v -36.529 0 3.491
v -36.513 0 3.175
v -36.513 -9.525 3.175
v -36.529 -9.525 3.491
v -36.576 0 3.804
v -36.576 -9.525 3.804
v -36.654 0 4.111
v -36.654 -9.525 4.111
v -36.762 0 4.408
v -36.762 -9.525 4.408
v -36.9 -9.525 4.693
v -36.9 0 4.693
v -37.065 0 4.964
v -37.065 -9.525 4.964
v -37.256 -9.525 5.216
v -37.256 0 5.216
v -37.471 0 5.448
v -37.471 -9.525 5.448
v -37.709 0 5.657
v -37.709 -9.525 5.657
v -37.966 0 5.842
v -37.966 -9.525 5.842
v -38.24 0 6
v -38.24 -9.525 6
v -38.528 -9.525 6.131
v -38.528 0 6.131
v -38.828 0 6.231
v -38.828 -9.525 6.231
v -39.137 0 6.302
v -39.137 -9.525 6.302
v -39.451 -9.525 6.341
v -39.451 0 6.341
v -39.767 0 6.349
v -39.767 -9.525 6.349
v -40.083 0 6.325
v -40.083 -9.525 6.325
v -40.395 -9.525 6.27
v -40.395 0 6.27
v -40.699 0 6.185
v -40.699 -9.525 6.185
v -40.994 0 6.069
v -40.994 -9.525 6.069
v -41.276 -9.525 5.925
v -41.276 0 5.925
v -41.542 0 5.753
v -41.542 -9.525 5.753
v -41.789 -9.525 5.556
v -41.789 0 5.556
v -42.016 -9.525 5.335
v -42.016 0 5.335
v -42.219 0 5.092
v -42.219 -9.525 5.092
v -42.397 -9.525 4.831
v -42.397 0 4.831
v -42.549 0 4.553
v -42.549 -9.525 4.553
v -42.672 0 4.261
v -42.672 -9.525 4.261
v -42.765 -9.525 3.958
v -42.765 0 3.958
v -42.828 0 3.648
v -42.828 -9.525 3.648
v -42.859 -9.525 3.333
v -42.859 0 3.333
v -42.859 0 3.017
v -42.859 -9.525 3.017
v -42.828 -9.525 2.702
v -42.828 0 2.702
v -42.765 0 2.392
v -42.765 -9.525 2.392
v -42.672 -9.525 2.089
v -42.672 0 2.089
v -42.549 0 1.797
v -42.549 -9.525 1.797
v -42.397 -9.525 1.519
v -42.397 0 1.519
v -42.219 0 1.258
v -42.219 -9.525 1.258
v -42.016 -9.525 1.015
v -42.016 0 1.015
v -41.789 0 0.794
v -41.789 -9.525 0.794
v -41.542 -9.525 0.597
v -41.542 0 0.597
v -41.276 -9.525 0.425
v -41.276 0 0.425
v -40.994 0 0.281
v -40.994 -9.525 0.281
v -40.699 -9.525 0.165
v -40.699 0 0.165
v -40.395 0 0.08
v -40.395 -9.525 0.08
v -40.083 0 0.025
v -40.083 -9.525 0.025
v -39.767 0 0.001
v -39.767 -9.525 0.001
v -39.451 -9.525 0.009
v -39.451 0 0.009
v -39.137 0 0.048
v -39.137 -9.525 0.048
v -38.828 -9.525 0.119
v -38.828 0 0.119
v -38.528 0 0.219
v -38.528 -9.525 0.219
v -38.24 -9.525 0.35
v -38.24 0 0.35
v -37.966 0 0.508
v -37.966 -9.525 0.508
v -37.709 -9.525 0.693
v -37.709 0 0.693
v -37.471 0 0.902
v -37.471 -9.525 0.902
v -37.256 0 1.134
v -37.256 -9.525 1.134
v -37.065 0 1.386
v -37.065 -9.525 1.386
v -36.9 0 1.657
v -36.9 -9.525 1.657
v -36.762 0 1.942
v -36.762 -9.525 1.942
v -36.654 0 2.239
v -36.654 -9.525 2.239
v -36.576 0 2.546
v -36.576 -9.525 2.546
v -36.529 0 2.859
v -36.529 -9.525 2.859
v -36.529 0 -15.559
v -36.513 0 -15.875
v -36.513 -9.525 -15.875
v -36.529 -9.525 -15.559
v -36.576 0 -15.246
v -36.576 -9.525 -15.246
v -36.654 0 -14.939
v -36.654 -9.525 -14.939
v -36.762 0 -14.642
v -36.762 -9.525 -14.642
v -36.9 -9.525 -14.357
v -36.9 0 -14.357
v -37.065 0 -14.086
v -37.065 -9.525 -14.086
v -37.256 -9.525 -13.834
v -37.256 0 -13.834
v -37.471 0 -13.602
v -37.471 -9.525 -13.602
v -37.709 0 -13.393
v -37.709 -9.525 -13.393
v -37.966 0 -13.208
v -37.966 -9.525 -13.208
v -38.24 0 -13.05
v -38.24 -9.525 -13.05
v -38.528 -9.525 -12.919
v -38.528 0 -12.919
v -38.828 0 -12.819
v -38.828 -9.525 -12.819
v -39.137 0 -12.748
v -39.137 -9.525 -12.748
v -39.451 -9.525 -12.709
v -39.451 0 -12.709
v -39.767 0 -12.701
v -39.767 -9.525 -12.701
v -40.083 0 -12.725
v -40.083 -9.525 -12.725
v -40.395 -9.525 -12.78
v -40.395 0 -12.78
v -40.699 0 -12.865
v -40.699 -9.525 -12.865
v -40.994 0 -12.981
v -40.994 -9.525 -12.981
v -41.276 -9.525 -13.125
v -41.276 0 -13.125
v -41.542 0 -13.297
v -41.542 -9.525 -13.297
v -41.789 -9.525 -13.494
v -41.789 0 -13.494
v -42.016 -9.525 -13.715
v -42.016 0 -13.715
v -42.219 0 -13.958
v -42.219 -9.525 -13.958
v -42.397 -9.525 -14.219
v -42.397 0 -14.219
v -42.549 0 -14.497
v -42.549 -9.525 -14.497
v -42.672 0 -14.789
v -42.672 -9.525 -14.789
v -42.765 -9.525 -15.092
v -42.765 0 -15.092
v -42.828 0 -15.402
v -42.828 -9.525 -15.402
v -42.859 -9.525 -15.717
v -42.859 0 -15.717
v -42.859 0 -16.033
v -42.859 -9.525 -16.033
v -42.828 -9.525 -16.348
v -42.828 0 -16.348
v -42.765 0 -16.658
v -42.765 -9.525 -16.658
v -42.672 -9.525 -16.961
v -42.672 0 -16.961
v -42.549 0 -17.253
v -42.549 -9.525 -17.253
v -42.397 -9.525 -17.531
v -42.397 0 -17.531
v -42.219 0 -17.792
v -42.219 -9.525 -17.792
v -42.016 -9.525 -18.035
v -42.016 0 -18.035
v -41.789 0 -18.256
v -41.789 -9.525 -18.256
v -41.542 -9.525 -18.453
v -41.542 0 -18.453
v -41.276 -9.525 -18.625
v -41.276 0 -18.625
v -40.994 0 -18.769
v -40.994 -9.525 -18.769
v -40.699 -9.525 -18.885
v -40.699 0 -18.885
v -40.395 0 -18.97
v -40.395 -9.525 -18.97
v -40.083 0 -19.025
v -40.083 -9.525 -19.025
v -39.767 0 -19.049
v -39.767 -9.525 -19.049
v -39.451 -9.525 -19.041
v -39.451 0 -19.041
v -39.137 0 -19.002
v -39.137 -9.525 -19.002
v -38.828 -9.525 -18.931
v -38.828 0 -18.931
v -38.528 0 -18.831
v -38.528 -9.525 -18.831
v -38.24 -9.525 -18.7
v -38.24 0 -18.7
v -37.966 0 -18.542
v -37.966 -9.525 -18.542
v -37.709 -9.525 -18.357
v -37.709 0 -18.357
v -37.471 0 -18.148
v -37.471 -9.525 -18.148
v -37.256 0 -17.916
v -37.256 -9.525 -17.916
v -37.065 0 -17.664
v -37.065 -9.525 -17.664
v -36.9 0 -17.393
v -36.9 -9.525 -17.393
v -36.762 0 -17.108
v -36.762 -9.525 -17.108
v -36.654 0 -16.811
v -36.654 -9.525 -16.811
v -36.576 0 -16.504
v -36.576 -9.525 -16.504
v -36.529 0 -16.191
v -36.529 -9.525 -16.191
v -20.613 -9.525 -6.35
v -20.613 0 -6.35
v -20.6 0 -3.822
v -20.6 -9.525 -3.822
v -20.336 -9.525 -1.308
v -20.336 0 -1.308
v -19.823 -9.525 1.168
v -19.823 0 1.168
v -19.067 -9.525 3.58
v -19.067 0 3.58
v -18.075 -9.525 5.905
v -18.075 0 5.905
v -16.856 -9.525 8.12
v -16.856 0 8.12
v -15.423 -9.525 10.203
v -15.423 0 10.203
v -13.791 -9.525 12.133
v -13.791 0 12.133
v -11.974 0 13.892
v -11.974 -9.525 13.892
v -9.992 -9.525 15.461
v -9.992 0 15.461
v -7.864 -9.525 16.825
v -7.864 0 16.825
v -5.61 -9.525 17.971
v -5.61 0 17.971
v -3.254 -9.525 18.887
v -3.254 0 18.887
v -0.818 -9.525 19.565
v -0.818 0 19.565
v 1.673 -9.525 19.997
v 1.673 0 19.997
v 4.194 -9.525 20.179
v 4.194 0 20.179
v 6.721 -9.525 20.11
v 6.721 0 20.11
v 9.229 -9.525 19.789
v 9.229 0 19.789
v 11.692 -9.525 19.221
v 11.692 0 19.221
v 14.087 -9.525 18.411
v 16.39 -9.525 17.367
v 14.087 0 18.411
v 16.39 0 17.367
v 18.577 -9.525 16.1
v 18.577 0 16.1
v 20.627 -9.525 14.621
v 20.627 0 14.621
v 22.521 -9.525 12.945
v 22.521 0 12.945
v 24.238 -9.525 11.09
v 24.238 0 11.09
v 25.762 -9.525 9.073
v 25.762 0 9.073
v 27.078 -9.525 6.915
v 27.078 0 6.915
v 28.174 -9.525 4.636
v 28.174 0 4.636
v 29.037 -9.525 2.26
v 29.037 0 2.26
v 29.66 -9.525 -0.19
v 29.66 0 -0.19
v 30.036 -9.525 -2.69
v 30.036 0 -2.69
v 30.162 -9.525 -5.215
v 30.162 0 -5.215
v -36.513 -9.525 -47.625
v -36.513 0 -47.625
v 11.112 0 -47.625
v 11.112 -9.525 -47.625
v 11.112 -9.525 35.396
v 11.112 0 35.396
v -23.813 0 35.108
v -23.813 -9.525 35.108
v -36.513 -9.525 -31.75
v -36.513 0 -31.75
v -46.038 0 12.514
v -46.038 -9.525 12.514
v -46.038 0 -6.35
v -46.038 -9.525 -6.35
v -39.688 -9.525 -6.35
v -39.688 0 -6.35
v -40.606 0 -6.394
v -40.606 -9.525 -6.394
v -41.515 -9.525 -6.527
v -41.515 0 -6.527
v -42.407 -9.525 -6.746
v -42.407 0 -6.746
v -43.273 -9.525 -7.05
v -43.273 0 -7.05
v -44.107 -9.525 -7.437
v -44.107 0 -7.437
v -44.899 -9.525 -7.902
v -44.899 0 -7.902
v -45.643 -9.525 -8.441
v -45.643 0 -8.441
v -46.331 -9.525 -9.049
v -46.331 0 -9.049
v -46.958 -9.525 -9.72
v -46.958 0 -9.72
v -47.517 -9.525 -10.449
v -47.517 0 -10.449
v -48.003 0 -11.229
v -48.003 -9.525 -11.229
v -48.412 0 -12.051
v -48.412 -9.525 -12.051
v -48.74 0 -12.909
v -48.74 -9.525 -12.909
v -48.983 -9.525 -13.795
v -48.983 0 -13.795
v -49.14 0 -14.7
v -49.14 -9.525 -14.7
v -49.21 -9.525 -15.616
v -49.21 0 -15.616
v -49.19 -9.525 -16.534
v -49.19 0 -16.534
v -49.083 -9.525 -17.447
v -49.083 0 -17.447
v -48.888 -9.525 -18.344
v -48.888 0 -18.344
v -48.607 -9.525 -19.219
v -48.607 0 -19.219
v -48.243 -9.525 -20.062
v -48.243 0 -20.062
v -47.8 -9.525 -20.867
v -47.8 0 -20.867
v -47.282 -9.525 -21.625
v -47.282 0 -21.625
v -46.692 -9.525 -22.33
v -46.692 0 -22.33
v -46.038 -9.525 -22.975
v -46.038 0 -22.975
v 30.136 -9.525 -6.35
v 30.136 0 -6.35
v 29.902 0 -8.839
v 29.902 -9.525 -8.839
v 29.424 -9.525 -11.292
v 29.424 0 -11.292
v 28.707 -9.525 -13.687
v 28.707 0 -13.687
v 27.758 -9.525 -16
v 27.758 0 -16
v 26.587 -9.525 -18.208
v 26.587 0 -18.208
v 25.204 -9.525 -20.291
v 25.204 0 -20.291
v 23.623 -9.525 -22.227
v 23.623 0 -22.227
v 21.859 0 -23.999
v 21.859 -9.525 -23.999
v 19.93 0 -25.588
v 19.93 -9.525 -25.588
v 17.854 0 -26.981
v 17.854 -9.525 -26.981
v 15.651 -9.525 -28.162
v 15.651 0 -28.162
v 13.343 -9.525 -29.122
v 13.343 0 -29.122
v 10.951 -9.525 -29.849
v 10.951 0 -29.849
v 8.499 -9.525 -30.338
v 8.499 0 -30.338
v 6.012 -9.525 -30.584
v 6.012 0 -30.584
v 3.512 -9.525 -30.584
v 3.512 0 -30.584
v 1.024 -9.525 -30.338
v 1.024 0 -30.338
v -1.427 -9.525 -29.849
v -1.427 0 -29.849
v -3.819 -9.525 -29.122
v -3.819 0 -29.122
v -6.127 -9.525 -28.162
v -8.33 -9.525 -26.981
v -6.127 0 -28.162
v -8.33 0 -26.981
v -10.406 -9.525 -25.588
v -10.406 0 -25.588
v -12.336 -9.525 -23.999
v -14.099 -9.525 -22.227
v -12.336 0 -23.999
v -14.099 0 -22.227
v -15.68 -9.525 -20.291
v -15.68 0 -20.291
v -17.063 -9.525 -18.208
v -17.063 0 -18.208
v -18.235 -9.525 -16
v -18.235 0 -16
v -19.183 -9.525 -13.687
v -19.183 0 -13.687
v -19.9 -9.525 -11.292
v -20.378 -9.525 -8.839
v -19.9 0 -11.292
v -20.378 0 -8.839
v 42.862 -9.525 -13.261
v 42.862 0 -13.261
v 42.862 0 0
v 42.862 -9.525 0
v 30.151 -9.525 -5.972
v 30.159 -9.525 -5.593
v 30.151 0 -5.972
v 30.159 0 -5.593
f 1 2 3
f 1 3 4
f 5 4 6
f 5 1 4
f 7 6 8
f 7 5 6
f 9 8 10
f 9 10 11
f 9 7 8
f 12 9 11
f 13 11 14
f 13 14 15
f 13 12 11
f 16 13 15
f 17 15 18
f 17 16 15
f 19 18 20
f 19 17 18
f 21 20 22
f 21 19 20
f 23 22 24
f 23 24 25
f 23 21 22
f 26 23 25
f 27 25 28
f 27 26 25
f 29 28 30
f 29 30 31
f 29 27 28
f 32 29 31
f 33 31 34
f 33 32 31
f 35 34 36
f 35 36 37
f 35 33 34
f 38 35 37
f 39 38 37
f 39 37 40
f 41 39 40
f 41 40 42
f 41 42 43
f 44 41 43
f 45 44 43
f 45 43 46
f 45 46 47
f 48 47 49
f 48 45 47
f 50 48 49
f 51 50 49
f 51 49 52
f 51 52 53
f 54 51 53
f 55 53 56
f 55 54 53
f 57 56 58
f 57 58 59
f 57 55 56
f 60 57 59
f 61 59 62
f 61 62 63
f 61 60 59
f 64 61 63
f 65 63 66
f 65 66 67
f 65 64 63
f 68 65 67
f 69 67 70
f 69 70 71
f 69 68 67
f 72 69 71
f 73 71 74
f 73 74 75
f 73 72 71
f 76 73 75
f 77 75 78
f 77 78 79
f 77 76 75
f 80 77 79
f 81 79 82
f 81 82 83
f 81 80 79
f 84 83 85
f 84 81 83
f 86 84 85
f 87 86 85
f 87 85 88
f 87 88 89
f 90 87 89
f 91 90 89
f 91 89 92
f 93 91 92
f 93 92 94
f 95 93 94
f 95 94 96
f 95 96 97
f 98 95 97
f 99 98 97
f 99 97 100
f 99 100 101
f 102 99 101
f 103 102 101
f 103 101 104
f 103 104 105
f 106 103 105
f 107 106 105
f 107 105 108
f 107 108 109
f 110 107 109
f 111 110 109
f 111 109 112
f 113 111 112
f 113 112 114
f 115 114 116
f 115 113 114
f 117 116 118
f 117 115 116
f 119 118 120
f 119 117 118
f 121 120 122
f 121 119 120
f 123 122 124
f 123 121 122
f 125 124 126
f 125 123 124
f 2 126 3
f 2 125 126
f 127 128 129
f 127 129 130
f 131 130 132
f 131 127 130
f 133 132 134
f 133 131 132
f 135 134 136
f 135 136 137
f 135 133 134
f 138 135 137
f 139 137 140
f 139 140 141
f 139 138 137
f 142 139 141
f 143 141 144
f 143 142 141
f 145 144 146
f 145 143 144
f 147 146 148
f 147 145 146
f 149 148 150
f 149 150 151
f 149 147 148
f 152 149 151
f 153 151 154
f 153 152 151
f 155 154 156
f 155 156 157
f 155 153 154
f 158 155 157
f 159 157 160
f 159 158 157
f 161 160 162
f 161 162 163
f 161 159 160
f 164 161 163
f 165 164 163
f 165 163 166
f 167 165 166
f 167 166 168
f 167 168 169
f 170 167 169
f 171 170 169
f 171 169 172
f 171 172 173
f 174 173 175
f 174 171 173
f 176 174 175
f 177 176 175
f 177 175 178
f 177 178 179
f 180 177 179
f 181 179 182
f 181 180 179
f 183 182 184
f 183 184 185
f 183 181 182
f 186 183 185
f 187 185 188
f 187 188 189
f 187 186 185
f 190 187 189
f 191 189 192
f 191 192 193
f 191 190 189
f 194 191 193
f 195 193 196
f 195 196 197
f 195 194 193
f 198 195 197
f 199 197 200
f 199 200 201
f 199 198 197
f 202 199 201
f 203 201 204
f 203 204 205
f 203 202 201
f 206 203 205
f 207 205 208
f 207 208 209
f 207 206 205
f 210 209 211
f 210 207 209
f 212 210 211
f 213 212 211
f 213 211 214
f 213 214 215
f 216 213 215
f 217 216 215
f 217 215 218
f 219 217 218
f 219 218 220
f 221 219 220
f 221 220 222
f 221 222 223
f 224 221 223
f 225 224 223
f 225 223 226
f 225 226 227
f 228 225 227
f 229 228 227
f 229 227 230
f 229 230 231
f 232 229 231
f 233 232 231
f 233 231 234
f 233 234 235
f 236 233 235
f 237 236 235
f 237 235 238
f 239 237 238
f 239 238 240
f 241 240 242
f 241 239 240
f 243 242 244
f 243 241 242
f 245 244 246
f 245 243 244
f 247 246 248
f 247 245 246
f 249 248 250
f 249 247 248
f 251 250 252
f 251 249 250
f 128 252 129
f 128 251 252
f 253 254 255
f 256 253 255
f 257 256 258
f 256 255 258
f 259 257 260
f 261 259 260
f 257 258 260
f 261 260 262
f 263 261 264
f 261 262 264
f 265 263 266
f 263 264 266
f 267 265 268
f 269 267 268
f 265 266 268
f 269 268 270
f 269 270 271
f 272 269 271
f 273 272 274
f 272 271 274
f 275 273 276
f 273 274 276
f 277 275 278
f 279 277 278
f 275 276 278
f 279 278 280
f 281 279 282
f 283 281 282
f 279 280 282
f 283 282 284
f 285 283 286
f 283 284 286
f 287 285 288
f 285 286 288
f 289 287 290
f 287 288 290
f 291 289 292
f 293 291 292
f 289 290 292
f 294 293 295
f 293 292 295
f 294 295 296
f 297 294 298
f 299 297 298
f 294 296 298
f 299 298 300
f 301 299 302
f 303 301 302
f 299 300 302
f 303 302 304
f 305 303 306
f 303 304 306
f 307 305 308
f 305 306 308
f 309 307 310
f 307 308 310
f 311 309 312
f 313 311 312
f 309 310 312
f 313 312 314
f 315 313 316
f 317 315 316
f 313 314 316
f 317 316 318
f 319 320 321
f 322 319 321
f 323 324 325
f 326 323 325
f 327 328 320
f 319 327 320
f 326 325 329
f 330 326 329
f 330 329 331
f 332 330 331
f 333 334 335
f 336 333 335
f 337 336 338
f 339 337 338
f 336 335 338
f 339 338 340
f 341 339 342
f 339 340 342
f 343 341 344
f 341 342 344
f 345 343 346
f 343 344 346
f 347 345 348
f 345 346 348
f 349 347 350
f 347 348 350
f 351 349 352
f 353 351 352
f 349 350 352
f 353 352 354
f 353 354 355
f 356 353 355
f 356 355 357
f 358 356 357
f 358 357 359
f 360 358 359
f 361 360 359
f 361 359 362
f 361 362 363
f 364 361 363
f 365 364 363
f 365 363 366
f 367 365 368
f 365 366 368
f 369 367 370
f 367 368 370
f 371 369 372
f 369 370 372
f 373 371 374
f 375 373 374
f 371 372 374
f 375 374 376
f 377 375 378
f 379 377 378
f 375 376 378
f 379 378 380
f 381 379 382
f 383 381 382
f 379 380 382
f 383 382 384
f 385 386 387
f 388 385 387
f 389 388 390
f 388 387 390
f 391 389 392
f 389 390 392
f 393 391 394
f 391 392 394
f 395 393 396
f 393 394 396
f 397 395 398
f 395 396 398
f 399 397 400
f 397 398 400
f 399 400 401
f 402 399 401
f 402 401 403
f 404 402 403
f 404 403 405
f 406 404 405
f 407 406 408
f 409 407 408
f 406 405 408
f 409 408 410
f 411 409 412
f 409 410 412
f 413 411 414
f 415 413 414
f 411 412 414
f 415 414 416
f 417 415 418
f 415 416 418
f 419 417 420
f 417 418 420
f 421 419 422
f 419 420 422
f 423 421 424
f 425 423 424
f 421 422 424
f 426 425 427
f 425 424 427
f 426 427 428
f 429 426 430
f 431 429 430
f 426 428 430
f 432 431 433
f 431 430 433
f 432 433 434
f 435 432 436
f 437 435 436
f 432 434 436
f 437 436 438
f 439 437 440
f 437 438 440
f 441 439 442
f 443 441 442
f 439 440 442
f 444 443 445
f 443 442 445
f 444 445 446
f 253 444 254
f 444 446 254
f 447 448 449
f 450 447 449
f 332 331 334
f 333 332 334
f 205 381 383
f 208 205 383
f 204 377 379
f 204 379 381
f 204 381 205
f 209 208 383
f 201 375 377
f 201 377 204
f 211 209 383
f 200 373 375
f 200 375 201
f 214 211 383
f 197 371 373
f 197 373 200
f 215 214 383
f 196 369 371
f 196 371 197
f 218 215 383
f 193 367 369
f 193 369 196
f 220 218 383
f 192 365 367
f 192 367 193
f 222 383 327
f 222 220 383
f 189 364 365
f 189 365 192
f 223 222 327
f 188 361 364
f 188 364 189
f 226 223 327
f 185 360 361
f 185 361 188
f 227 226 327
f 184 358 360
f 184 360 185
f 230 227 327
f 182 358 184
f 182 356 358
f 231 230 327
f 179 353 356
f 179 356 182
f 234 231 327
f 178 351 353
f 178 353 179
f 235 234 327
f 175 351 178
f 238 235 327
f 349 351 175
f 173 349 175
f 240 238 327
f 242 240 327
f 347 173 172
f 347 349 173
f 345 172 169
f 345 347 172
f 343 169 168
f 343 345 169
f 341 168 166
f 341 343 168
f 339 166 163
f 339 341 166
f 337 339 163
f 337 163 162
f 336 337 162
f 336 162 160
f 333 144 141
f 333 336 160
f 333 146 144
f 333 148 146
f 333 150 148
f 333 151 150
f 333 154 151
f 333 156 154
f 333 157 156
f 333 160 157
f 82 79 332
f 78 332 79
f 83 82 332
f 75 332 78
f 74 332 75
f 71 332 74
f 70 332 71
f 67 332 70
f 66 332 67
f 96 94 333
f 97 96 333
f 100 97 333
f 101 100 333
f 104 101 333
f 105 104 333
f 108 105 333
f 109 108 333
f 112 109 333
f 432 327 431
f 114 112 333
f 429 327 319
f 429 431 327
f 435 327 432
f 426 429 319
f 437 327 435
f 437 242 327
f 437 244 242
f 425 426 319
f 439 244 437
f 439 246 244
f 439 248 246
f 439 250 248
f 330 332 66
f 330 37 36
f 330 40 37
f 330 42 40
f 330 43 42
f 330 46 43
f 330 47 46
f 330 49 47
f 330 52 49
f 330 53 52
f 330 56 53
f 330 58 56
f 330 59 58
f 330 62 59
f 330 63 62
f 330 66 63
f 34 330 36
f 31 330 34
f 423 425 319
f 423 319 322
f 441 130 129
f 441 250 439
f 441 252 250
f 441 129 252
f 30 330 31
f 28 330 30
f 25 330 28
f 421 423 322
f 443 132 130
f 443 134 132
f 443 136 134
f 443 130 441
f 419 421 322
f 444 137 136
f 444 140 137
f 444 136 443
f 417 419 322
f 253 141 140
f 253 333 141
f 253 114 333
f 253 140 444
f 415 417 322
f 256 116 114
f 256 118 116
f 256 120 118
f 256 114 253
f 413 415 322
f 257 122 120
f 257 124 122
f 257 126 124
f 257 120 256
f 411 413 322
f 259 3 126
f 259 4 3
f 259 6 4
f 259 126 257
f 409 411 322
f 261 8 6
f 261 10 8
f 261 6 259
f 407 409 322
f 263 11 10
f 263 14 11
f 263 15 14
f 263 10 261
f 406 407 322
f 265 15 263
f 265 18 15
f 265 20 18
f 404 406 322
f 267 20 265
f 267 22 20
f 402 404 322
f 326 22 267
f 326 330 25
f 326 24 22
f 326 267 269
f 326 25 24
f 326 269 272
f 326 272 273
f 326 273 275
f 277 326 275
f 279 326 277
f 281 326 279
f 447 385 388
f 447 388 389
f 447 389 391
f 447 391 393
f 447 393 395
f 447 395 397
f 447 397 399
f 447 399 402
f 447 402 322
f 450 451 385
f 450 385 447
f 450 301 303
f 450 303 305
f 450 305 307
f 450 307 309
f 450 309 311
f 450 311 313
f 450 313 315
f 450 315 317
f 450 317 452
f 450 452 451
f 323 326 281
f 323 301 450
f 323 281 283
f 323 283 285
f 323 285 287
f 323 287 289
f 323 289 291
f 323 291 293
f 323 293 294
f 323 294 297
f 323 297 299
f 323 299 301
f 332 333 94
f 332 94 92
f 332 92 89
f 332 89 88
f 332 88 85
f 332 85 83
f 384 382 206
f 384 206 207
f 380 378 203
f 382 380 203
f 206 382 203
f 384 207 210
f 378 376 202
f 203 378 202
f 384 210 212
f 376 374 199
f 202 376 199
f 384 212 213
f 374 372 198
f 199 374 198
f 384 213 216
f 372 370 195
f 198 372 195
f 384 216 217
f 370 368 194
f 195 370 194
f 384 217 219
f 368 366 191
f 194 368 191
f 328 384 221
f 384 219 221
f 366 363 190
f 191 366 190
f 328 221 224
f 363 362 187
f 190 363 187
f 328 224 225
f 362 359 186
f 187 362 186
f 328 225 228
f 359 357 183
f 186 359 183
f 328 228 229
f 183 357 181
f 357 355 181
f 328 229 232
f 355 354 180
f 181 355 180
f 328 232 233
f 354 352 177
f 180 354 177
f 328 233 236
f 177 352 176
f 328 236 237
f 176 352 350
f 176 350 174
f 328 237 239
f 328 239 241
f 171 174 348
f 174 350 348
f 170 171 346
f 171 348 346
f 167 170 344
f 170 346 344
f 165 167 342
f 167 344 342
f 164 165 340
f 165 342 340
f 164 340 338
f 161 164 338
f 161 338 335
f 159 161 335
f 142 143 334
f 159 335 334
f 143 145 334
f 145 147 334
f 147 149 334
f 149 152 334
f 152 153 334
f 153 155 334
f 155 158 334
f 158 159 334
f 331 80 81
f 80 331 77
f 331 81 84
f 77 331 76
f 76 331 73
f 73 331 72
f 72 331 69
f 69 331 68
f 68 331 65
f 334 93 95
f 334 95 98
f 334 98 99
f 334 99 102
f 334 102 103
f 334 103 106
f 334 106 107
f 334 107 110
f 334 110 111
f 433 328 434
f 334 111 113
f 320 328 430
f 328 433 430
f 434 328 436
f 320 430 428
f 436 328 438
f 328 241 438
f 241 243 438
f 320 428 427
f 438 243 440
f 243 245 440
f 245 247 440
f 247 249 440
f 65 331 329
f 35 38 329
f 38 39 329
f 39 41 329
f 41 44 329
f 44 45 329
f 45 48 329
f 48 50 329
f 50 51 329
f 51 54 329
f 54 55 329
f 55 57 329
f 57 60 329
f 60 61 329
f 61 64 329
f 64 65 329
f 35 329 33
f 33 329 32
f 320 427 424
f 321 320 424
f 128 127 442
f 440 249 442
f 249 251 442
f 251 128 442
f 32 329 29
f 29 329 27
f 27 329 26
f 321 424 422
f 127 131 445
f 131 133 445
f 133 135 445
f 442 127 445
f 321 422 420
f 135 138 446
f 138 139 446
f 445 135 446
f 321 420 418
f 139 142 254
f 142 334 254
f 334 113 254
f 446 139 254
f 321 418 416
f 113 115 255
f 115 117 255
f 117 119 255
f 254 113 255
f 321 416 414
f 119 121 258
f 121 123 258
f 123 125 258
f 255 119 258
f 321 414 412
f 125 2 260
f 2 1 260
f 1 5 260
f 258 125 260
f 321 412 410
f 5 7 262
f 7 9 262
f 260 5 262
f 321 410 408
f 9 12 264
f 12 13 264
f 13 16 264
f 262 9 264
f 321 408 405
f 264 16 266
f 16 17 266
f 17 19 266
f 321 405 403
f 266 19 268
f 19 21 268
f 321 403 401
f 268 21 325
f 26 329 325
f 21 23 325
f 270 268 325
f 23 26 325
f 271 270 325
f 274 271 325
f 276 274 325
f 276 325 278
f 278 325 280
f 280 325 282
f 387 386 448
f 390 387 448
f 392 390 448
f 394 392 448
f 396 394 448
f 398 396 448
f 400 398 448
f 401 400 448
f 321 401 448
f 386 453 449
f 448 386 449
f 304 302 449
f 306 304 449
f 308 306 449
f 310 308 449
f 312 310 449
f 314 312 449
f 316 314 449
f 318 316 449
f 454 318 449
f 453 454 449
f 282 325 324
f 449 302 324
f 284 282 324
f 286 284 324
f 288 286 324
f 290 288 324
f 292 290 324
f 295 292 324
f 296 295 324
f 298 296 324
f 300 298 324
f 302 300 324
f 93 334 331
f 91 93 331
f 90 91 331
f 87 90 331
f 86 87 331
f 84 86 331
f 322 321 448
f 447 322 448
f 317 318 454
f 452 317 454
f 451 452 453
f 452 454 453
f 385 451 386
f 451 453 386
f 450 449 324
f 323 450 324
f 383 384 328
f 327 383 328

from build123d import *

# Parameters (mm, degrees)
F0_R     = 3.175
F1_DEPTH = 9.525
F2_DEPTH = 9.525


with BuildPart() as f1:
    # F0 (on Front) → F1 (new body)
    with BuildSketch(Plane.XZ):
        with BuildLine():
            Line((-23.813147, 35.108108), (-46.038147, 12.51385))
            Line((-46.038147, 12.51385), (-46.038147, -6.35))
            Line((-46.038147, -6.35), (-39.688147, -6.35))
            Line((-39.688147, -6.35), (-20.612767, -6.35))
            ThreePointArc((-20.612767, -6.35), (4.194114, 20.178848), (30.161853, -5.214807))
            ThreePointArc((30.161853, -5.214807), (30.155507, -5.782545), (30.136473, -6.35))
            Line((30.136473, -6.35), (42.861853, -6.35))
            Line((42.861853, -6.35), (42.861853, 0))
            Line((42.861853, 0), (11.111853, 35.395849))
            Line((11.111853, 35.395849), (-23.813147, 35.108108))
        make_face()
        with Locations((-39.688147, 3.175)):
            Circle(F0_R, mode=Mode.SUBTRACT)
    extrude(amount=F1_DEPTH)

    # F0 (on Front) → F2 (join)
    with BuildSketch(Plane.XZ):
        with BuildLine():
            Line((-20.612767, -6.35), (-39.688147, -6.35))
            ThreePointArc((-39.688147, -6.35), (-48.586139, -12.47627), (-46.038147, -22.974516))
            Line((-46.038147, -22.974516), (-36.513147, -31.75))
            Line((-36.513147, -31.75), (-36.513147, -47.625))
            Line((-36.513147, -47.625), (11.111853, -47.625))
            Line((11.111853, -47.625), (42.861853, -13.260503))
            Line((42.861853, -13.260503), (42.861853, -6.35))
            Line((42.861853, -6.35), (30.136473, -6.35))
            ThreePointArc((30.136473, -6.35), (4.761853, -30.614807), (-20.612767, -6.35))
        make_face()
        with Locations((-39.688147, -15.875)):
            Circle(F0_R, mode=Mode.SUBTRACT)
    extrude(amount=F2_DEPTH)


solid = f1.part
